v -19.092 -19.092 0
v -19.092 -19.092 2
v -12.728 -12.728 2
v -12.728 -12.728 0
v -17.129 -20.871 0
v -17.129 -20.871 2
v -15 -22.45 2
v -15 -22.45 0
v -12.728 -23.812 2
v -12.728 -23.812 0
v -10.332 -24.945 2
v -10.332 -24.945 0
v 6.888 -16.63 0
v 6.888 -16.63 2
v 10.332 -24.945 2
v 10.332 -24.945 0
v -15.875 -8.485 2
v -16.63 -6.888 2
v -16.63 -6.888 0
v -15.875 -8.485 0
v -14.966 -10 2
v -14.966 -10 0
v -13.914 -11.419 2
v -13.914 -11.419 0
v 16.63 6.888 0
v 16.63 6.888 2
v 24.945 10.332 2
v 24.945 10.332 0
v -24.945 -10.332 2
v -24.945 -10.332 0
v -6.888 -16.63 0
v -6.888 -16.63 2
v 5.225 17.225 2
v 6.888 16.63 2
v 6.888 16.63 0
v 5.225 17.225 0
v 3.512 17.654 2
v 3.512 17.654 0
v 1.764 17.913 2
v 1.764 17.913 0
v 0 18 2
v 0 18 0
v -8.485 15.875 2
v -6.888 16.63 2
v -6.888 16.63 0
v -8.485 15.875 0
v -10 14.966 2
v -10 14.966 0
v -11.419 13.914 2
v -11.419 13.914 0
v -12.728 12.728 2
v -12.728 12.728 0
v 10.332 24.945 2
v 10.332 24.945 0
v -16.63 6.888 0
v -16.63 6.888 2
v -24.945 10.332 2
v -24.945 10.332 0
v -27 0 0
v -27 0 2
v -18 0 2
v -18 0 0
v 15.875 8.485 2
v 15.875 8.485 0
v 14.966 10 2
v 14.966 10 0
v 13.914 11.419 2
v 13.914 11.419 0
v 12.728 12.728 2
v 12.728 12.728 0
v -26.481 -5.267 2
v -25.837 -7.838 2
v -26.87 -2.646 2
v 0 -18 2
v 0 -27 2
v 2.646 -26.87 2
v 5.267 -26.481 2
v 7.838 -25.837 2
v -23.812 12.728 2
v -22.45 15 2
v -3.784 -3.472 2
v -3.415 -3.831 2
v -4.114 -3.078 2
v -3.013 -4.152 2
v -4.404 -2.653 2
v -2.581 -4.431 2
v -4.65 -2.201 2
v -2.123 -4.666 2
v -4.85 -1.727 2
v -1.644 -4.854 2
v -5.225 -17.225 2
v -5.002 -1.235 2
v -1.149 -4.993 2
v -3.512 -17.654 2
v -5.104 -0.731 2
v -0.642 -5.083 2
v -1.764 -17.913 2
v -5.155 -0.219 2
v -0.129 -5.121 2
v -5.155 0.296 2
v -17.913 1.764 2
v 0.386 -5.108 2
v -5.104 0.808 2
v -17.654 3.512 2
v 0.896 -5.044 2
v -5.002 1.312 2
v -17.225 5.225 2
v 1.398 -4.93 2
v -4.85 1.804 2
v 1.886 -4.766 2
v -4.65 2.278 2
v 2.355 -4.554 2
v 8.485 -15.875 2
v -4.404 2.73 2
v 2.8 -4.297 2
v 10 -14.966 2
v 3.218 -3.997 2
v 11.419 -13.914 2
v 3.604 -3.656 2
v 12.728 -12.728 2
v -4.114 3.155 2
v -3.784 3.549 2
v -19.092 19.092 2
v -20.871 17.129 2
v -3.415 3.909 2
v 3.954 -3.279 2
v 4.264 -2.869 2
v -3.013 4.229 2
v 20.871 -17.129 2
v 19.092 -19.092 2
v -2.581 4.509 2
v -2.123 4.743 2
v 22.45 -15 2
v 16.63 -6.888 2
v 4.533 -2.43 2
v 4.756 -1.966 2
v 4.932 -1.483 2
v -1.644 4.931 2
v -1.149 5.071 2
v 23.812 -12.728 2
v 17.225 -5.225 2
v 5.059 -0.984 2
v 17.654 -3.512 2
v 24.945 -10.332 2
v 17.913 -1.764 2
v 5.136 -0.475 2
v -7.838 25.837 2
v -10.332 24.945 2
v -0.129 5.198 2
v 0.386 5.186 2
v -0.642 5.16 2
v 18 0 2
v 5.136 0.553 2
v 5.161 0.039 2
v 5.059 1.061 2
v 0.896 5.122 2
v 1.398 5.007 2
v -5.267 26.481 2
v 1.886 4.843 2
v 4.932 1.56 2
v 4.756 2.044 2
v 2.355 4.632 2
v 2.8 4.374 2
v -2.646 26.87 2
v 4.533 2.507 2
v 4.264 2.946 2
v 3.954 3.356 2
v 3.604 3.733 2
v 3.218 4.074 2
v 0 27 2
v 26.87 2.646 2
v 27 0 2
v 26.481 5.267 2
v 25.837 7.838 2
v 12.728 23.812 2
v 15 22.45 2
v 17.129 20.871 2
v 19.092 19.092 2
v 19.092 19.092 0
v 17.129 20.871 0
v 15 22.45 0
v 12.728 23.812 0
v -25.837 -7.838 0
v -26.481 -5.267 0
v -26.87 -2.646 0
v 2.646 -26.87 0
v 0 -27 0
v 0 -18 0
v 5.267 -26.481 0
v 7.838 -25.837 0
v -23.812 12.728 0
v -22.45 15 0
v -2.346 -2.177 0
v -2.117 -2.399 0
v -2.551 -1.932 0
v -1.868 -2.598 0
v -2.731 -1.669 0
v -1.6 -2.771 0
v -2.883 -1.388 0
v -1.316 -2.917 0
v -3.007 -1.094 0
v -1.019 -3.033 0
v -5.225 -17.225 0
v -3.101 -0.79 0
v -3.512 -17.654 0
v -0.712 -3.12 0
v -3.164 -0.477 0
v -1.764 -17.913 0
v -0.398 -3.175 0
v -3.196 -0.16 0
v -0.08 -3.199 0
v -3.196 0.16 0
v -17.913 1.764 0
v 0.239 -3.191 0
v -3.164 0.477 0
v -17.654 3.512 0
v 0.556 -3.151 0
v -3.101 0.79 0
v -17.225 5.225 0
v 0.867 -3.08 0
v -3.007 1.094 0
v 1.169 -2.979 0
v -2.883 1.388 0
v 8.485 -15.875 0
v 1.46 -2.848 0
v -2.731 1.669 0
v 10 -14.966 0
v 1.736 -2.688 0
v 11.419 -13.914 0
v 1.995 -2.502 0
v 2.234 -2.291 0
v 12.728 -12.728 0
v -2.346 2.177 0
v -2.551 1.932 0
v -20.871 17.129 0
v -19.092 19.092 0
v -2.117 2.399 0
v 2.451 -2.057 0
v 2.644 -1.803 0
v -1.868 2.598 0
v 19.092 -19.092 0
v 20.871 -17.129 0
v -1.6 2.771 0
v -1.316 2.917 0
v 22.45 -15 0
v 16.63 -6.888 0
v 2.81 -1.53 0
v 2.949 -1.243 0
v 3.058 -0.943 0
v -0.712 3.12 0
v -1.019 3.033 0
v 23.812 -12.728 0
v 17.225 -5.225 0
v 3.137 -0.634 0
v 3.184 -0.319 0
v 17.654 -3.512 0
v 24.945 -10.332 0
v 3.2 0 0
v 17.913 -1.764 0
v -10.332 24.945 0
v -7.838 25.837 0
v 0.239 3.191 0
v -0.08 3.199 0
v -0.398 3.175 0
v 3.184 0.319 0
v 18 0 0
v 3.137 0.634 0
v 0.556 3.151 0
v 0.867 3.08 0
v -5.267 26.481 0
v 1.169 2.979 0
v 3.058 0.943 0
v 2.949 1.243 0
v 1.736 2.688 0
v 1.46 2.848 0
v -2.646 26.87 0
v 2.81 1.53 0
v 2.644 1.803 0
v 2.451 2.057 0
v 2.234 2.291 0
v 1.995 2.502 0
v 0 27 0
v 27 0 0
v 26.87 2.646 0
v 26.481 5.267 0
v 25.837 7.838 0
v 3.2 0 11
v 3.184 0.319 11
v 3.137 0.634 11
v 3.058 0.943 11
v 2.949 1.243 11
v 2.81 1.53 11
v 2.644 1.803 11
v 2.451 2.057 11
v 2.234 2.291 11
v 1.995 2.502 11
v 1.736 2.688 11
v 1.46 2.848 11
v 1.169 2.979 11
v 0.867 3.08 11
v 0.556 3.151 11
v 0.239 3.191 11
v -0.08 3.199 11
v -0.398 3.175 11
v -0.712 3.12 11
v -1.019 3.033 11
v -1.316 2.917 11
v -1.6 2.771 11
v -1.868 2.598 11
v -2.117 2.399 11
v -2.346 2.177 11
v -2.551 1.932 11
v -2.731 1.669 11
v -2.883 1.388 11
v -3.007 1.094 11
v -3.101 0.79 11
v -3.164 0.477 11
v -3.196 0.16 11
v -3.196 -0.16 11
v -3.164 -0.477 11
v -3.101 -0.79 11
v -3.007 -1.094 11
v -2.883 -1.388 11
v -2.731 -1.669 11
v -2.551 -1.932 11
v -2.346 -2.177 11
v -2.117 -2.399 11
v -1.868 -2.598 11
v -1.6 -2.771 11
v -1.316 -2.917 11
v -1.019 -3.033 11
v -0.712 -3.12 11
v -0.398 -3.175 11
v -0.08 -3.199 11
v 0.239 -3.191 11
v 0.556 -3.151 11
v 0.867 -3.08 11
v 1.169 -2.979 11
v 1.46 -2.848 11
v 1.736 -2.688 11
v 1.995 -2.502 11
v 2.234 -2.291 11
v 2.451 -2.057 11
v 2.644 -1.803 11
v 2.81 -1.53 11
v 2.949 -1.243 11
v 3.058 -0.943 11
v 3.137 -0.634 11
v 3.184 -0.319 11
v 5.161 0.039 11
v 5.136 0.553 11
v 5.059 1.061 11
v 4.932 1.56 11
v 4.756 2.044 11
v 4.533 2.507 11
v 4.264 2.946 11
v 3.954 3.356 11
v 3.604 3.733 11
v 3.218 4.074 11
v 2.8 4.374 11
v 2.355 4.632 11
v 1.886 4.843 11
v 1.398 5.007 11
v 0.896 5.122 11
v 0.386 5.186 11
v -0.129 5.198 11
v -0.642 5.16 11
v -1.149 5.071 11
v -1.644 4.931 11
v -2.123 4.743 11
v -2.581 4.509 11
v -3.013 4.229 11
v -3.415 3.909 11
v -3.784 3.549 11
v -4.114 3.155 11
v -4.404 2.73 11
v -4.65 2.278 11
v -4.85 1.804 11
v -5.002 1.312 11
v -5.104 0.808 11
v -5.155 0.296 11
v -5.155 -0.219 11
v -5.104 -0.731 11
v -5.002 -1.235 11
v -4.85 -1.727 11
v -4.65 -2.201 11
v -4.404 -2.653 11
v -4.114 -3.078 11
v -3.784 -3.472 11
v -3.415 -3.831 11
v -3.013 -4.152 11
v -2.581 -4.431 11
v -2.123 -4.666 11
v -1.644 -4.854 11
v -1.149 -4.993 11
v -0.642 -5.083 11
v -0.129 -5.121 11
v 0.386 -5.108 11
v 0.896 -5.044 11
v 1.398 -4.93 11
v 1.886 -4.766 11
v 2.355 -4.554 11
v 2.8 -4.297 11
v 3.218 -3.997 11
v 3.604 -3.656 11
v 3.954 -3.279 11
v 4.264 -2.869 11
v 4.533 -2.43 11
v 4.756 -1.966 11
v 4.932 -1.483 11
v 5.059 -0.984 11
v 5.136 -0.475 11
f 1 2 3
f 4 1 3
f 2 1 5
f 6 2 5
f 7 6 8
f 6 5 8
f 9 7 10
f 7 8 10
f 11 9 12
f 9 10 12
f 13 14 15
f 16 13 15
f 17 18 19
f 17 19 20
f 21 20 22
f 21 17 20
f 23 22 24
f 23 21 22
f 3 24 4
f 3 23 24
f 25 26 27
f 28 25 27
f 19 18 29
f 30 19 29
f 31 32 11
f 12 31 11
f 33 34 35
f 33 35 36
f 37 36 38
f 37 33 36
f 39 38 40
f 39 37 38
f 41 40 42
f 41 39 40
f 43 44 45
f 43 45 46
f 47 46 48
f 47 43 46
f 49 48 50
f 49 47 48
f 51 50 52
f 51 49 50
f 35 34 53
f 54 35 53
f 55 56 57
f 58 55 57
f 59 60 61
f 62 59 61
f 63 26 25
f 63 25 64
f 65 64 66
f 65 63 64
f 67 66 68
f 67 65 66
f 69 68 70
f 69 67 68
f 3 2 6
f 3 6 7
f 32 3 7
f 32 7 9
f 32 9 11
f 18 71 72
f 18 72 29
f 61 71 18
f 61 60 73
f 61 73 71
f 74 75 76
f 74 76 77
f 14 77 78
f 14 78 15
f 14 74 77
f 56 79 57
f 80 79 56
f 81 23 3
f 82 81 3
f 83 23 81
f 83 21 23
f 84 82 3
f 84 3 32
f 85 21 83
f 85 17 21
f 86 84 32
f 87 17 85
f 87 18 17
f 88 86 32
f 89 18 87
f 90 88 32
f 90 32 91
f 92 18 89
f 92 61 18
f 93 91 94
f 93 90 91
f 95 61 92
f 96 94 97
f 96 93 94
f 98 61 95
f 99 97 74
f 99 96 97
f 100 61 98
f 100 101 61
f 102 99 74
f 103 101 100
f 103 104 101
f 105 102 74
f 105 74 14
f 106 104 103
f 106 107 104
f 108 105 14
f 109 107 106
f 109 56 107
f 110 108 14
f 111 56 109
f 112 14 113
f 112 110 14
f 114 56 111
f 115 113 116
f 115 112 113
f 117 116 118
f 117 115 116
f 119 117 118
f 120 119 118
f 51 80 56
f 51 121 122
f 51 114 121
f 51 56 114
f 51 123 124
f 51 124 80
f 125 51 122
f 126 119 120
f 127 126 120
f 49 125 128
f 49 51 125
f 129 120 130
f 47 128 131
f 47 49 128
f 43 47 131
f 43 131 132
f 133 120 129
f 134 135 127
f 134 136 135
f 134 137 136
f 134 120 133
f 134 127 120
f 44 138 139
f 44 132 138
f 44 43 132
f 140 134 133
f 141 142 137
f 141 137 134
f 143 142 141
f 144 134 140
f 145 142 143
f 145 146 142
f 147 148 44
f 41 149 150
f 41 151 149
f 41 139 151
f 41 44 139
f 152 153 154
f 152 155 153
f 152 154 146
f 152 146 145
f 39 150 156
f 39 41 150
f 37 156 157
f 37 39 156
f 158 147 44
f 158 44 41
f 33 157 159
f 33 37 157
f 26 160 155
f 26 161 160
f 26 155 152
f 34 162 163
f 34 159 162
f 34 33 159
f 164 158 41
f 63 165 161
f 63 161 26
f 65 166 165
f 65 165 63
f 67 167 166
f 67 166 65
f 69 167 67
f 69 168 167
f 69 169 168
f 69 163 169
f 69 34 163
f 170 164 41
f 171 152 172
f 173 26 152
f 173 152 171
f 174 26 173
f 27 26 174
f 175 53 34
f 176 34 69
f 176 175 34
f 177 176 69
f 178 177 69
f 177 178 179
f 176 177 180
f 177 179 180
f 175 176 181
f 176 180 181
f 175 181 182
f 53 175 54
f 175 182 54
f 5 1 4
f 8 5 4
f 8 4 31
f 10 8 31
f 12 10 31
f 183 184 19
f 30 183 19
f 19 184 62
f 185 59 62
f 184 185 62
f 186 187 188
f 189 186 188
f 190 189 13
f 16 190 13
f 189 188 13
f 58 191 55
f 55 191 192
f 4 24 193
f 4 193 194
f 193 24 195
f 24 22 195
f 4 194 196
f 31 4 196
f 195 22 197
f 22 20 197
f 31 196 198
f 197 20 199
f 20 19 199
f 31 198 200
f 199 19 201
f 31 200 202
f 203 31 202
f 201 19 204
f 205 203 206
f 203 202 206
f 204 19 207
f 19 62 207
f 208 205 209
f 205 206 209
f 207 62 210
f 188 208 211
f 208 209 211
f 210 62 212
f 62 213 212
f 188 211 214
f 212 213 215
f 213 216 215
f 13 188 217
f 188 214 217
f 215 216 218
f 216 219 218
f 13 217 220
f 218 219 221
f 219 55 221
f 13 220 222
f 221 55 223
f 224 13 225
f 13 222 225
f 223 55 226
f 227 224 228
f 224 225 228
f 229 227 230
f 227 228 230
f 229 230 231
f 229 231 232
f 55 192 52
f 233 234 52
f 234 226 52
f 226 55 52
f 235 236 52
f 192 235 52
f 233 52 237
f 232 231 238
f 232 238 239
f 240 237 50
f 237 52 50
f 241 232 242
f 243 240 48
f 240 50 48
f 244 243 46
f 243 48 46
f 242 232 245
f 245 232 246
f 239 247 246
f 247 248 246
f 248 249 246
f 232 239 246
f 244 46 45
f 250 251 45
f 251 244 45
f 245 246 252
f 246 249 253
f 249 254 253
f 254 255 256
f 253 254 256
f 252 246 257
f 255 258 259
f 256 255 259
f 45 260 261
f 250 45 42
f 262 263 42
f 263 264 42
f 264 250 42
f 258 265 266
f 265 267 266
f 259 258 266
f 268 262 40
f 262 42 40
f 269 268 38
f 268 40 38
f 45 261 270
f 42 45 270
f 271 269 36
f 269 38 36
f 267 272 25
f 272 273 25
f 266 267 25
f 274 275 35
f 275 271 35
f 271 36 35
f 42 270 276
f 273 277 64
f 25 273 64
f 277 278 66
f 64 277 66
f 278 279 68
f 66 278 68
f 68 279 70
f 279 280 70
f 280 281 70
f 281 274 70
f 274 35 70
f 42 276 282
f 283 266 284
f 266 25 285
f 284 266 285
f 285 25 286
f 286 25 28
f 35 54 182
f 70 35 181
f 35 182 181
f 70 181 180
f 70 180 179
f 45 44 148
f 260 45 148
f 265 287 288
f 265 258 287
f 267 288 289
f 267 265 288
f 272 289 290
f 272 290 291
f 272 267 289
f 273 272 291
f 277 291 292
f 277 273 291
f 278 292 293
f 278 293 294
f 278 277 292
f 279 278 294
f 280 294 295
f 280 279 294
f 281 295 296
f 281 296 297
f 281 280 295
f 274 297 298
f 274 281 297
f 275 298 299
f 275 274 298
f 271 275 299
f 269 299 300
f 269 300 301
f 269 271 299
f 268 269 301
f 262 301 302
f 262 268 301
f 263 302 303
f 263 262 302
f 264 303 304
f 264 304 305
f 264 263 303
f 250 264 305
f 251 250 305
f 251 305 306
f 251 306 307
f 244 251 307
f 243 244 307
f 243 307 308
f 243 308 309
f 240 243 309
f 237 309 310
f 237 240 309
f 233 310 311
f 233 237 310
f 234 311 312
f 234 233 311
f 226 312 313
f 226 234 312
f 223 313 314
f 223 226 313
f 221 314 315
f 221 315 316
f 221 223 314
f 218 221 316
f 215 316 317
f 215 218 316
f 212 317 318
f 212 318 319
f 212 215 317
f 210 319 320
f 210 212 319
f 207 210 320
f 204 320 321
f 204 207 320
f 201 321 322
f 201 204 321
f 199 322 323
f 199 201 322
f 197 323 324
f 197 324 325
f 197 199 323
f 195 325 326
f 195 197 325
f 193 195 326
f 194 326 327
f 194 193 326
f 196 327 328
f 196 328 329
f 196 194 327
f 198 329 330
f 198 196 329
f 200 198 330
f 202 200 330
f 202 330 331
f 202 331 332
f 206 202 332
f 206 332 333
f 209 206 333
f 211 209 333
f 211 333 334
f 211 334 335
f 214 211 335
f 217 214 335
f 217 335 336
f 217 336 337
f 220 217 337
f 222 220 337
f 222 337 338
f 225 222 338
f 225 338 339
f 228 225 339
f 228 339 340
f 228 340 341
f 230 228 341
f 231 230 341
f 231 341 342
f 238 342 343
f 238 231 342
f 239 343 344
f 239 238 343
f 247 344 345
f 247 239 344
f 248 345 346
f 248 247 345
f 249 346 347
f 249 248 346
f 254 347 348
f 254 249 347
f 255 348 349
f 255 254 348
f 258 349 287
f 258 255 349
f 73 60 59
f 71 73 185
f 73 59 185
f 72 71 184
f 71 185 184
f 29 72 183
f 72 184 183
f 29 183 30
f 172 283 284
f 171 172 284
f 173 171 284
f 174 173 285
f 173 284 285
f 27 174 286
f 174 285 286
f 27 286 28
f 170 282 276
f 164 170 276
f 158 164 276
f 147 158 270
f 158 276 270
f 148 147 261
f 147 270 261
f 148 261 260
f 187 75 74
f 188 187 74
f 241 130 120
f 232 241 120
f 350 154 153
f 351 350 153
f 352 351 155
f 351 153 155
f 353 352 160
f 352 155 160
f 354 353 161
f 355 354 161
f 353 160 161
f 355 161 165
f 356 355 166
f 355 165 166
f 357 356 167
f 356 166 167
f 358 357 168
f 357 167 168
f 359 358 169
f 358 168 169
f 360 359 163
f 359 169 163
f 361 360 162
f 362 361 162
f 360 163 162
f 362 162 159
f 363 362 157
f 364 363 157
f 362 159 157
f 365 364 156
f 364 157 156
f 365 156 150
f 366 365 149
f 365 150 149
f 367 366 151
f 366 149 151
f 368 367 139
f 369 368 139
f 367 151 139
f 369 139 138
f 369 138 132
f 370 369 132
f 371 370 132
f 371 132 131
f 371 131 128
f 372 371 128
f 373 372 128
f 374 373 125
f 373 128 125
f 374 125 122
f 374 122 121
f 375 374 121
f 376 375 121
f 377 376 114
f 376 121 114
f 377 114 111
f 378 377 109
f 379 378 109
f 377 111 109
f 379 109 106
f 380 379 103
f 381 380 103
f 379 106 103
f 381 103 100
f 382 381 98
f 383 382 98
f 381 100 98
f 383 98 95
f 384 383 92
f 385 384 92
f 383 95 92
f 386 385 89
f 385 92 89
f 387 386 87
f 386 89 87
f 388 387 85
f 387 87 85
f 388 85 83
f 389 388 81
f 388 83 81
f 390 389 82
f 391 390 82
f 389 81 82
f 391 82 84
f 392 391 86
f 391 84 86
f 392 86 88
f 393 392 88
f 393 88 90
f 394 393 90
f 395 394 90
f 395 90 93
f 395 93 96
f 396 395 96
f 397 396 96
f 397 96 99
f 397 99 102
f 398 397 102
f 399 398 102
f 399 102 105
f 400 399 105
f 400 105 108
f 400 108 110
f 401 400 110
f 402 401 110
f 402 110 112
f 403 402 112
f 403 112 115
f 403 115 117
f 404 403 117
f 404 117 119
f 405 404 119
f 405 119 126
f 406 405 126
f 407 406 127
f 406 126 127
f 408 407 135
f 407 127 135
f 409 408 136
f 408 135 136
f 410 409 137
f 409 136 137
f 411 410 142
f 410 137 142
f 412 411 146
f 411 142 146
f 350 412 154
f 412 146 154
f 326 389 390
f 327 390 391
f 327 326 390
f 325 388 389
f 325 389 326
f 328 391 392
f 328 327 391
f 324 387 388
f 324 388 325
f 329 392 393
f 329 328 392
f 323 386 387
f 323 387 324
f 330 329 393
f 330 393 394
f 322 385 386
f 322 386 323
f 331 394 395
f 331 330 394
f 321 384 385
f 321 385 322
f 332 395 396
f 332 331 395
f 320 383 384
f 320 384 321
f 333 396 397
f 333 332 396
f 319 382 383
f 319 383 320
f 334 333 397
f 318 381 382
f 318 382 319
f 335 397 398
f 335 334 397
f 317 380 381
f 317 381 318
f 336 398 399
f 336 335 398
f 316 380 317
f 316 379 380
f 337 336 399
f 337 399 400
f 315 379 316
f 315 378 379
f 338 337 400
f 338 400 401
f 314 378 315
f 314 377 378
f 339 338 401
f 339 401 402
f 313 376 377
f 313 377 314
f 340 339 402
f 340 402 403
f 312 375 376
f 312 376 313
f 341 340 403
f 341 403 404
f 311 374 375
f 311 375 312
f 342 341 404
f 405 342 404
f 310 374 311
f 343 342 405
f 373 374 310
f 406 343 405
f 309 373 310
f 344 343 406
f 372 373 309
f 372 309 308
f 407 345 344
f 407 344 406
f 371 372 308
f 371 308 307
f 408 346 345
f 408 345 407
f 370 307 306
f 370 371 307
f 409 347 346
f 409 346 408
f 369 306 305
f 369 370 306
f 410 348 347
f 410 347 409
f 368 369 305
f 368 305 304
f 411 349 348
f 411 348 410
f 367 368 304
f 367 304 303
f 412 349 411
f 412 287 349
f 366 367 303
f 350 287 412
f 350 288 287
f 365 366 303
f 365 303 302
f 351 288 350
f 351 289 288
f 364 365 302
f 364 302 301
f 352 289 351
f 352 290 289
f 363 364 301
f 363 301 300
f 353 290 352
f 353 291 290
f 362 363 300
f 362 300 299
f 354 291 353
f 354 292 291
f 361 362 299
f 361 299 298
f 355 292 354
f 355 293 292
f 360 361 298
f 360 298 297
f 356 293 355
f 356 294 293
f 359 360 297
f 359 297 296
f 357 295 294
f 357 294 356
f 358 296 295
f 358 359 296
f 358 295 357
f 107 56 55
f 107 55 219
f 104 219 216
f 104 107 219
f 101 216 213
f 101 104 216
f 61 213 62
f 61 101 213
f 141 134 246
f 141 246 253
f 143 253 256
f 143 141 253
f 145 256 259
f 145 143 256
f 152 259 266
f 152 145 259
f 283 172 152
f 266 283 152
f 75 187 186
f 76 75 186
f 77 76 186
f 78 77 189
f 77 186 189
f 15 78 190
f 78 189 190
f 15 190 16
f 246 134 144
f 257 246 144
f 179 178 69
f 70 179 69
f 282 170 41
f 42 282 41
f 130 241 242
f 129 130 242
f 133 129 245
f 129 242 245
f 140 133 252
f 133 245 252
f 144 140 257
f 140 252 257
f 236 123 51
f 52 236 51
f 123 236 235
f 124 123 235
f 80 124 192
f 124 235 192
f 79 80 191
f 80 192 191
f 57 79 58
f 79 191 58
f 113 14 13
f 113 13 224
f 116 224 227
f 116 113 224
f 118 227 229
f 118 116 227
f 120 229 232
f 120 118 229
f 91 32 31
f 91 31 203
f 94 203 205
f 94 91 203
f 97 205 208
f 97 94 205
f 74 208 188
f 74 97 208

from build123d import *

# Parameters (mm, degrees)
SKETCH_R           = 27
SKETCH_R_2         = 3.2
PAD_DEPTH          = 2
SKETCH001_R        = 5.161315
SKETCH001_R_2      = 3.2
PAD001_DEPTH       = 9
POCKET_DEPTH       = 156.312374
POLARPATTERN_COUNT = 8


with BuildPart() as part:
    # Sketch → Pad (new body)
    with BuildSketch(Plane.XY):
        Circle(SKETCH_R)
        Circle(SKETCH_R_2, mode=Mode.SUBTRACT)
    extrude(amount=PAD_DEPTH)

    # Sketch001 (on Face4 of Pad) → Pad001 (join)
    with BuildSketch(Plane.XY.offset(2)):
        with Locations((-8.6e-05, 0.038685)):
            Circle(SKETCH001_R)
        Circle(SKETCH001_R_2, mode=Mode.SUBTRACT)
    extrude(amount=PAD001_DEPTH)

    # Sketch002 (on Face3 of Pad001) → Pocket (cut, through all)
    with BuildSketch(Plane.XY.offset(2)):
        with BuildLine():
            Line((0, 32.043877), (0, 18))
            ThreePointArc((6.888302, 16.629832), (3.511626, 17.654135), (0, 18))
            Line((6.888302, 16.629832), (12.262661, 29.604683))
            Line((0, 32.043877), (12.262661, 29.604683))
        make_face()
    pocket = extrude(amount=-POCKET_DEPTH, mode=Mode.SUBTRACT)

    # PolarPattern: Pocket ×8 about axis
    polarpattern_axis = Axis((0, 0, 2), (0, 0, 1))
    for i in range(1, POLARPATTERN_COUNT):
        add(pocket.rotate(polarpattern_axis, i * 360 / POLARPATTERN_COUNT), mode=Mode.SUBTRACT)


solid = part.part
